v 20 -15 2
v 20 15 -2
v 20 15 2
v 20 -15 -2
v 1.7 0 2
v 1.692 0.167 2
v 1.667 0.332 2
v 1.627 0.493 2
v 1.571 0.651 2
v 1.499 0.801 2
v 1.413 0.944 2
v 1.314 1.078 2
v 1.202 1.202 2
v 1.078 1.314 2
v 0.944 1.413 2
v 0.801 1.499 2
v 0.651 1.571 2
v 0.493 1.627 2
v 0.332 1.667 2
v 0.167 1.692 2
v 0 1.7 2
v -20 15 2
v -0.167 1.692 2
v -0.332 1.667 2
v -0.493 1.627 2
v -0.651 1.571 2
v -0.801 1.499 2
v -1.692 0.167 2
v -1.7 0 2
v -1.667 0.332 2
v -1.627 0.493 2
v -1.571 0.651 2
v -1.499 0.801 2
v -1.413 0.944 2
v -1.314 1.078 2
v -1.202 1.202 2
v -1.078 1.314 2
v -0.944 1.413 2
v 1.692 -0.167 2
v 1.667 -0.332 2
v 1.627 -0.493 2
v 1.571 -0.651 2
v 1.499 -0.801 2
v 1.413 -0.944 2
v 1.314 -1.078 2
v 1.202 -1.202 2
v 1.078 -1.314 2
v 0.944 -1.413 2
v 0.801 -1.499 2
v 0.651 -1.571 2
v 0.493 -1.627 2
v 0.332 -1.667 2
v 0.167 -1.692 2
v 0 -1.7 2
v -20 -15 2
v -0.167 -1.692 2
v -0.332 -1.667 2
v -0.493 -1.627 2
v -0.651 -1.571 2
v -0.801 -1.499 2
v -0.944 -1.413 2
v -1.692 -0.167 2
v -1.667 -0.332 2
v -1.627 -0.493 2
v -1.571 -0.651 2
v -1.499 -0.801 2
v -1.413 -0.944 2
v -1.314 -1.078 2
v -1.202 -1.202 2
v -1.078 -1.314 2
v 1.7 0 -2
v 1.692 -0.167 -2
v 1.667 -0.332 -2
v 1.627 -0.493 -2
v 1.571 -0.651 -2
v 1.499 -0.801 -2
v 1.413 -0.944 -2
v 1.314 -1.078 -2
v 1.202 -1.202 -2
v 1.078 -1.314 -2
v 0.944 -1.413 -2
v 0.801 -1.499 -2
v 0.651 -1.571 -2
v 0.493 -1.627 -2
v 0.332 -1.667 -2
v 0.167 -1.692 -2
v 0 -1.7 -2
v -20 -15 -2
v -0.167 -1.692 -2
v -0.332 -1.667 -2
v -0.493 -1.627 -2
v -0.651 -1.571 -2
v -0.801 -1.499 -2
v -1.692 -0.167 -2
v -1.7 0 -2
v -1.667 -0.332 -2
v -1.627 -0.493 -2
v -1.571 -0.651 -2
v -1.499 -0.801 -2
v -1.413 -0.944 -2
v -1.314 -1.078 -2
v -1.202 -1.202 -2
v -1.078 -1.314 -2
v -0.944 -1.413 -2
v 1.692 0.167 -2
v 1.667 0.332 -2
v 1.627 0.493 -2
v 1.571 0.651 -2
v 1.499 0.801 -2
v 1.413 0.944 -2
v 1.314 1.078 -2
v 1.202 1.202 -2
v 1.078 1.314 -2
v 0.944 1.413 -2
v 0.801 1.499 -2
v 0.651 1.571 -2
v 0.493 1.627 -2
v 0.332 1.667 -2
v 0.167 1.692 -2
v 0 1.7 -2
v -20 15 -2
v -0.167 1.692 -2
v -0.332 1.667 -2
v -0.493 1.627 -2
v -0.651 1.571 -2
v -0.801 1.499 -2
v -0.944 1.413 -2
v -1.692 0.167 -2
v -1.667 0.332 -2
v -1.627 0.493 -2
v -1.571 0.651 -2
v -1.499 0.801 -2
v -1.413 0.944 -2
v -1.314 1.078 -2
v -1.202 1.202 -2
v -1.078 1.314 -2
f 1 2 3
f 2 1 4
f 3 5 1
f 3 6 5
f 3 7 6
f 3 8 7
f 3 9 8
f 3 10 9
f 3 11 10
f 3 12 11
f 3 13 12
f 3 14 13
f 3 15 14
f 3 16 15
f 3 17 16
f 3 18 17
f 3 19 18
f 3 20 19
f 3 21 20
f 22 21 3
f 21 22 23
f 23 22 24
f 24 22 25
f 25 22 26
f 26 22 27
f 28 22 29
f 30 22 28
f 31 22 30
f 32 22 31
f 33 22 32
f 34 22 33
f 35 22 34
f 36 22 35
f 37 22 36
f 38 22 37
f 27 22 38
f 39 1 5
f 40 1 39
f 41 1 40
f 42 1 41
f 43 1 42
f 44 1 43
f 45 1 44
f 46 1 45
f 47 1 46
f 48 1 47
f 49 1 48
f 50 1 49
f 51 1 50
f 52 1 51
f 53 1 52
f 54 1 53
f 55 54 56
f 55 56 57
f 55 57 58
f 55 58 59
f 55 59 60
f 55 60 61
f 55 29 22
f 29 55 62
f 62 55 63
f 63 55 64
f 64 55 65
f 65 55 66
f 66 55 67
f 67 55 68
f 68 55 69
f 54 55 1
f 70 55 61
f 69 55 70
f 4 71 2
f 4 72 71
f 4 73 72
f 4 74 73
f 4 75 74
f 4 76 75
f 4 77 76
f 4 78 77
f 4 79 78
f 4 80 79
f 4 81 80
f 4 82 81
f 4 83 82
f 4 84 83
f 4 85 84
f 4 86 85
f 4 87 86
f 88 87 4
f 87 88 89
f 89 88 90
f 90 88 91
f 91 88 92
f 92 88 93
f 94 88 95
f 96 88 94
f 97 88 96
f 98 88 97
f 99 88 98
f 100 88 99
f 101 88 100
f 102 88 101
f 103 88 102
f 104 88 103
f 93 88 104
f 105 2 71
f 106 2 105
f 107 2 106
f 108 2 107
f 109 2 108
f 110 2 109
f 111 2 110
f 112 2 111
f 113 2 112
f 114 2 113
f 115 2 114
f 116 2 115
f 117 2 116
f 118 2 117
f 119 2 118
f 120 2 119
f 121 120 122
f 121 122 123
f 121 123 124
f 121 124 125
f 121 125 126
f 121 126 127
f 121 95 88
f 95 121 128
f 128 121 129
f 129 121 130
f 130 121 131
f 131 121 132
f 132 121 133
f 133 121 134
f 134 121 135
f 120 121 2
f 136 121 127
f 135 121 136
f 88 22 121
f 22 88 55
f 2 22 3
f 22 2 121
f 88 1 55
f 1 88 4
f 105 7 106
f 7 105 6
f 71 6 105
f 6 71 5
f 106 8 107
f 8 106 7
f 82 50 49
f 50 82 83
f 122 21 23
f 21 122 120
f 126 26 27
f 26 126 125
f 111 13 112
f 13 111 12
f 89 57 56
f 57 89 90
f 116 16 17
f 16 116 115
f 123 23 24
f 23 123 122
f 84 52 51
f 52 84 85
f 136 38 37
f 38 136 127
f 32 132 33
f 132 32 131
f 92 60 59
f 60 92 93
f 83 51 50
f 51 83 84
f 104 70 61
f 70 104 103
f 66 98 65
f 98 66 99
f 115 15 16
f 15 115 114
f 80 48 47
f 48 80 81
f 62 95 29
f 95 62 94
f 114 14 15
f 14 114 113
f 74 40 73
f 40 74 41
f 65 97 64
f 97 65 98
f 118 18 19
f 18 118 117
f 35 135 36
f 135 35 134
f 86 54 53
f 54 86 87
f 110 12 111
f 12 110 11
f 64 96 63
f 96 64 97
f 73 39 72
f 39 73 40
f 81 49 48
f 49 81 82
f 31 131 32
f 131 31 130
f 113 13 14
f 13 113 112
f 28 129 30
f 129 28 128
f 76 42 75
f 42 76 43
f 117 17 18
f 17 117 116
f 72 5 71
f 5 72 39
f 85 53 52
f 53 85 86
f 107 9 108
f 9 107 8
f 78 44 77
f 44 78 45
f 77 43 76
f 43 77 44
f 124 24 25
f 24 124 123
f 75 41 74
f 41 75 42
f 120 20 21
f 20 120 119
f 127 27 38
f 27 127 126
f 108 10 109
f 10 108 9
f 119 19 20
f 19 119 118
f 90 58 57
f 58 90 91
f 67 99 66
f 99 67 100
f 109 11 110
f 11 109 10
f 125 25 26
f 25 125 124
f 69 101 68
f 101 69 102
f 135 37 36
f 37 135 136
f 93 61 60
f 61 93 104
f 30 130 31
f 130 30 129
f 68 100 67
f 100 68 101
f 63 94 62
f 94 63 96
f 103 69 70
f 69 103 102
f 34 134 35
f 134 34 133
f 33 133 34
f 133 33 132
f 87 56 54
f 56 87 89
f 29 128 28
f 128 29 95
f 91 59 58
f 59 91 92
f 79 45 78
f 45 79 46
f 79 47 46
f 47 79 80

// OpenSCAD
render_fn = 64;
$fn = render_fn;
set = "__PLAMP_PART__"; // [__PLAMP_PART__, assembly]

part_w = 40;
part_d = 30;
part_h = 4;
boolean_overlap = 0.1;

module __PLAMP_PART___positive() {
    cube([part_w, part_d, part_h], center = true);
}

module __PLAMP_PART___negative() {
    echo("BOM", "M3x16 screw", 1);
    cylinder(d = 3.4, h = part_h + 2 * boolean_overlap, center = true);
}

module __PLAMP_PART__() {
    difference() {
        __PLAMP_PART___positive();
        __PLAMP_PART___negative();
    }
}

if (set == "__PLAMP_PART__") {
    __PLAMP_PART__();
} else if (set == "assembly") {
    __PLAMP_PART__();
}
